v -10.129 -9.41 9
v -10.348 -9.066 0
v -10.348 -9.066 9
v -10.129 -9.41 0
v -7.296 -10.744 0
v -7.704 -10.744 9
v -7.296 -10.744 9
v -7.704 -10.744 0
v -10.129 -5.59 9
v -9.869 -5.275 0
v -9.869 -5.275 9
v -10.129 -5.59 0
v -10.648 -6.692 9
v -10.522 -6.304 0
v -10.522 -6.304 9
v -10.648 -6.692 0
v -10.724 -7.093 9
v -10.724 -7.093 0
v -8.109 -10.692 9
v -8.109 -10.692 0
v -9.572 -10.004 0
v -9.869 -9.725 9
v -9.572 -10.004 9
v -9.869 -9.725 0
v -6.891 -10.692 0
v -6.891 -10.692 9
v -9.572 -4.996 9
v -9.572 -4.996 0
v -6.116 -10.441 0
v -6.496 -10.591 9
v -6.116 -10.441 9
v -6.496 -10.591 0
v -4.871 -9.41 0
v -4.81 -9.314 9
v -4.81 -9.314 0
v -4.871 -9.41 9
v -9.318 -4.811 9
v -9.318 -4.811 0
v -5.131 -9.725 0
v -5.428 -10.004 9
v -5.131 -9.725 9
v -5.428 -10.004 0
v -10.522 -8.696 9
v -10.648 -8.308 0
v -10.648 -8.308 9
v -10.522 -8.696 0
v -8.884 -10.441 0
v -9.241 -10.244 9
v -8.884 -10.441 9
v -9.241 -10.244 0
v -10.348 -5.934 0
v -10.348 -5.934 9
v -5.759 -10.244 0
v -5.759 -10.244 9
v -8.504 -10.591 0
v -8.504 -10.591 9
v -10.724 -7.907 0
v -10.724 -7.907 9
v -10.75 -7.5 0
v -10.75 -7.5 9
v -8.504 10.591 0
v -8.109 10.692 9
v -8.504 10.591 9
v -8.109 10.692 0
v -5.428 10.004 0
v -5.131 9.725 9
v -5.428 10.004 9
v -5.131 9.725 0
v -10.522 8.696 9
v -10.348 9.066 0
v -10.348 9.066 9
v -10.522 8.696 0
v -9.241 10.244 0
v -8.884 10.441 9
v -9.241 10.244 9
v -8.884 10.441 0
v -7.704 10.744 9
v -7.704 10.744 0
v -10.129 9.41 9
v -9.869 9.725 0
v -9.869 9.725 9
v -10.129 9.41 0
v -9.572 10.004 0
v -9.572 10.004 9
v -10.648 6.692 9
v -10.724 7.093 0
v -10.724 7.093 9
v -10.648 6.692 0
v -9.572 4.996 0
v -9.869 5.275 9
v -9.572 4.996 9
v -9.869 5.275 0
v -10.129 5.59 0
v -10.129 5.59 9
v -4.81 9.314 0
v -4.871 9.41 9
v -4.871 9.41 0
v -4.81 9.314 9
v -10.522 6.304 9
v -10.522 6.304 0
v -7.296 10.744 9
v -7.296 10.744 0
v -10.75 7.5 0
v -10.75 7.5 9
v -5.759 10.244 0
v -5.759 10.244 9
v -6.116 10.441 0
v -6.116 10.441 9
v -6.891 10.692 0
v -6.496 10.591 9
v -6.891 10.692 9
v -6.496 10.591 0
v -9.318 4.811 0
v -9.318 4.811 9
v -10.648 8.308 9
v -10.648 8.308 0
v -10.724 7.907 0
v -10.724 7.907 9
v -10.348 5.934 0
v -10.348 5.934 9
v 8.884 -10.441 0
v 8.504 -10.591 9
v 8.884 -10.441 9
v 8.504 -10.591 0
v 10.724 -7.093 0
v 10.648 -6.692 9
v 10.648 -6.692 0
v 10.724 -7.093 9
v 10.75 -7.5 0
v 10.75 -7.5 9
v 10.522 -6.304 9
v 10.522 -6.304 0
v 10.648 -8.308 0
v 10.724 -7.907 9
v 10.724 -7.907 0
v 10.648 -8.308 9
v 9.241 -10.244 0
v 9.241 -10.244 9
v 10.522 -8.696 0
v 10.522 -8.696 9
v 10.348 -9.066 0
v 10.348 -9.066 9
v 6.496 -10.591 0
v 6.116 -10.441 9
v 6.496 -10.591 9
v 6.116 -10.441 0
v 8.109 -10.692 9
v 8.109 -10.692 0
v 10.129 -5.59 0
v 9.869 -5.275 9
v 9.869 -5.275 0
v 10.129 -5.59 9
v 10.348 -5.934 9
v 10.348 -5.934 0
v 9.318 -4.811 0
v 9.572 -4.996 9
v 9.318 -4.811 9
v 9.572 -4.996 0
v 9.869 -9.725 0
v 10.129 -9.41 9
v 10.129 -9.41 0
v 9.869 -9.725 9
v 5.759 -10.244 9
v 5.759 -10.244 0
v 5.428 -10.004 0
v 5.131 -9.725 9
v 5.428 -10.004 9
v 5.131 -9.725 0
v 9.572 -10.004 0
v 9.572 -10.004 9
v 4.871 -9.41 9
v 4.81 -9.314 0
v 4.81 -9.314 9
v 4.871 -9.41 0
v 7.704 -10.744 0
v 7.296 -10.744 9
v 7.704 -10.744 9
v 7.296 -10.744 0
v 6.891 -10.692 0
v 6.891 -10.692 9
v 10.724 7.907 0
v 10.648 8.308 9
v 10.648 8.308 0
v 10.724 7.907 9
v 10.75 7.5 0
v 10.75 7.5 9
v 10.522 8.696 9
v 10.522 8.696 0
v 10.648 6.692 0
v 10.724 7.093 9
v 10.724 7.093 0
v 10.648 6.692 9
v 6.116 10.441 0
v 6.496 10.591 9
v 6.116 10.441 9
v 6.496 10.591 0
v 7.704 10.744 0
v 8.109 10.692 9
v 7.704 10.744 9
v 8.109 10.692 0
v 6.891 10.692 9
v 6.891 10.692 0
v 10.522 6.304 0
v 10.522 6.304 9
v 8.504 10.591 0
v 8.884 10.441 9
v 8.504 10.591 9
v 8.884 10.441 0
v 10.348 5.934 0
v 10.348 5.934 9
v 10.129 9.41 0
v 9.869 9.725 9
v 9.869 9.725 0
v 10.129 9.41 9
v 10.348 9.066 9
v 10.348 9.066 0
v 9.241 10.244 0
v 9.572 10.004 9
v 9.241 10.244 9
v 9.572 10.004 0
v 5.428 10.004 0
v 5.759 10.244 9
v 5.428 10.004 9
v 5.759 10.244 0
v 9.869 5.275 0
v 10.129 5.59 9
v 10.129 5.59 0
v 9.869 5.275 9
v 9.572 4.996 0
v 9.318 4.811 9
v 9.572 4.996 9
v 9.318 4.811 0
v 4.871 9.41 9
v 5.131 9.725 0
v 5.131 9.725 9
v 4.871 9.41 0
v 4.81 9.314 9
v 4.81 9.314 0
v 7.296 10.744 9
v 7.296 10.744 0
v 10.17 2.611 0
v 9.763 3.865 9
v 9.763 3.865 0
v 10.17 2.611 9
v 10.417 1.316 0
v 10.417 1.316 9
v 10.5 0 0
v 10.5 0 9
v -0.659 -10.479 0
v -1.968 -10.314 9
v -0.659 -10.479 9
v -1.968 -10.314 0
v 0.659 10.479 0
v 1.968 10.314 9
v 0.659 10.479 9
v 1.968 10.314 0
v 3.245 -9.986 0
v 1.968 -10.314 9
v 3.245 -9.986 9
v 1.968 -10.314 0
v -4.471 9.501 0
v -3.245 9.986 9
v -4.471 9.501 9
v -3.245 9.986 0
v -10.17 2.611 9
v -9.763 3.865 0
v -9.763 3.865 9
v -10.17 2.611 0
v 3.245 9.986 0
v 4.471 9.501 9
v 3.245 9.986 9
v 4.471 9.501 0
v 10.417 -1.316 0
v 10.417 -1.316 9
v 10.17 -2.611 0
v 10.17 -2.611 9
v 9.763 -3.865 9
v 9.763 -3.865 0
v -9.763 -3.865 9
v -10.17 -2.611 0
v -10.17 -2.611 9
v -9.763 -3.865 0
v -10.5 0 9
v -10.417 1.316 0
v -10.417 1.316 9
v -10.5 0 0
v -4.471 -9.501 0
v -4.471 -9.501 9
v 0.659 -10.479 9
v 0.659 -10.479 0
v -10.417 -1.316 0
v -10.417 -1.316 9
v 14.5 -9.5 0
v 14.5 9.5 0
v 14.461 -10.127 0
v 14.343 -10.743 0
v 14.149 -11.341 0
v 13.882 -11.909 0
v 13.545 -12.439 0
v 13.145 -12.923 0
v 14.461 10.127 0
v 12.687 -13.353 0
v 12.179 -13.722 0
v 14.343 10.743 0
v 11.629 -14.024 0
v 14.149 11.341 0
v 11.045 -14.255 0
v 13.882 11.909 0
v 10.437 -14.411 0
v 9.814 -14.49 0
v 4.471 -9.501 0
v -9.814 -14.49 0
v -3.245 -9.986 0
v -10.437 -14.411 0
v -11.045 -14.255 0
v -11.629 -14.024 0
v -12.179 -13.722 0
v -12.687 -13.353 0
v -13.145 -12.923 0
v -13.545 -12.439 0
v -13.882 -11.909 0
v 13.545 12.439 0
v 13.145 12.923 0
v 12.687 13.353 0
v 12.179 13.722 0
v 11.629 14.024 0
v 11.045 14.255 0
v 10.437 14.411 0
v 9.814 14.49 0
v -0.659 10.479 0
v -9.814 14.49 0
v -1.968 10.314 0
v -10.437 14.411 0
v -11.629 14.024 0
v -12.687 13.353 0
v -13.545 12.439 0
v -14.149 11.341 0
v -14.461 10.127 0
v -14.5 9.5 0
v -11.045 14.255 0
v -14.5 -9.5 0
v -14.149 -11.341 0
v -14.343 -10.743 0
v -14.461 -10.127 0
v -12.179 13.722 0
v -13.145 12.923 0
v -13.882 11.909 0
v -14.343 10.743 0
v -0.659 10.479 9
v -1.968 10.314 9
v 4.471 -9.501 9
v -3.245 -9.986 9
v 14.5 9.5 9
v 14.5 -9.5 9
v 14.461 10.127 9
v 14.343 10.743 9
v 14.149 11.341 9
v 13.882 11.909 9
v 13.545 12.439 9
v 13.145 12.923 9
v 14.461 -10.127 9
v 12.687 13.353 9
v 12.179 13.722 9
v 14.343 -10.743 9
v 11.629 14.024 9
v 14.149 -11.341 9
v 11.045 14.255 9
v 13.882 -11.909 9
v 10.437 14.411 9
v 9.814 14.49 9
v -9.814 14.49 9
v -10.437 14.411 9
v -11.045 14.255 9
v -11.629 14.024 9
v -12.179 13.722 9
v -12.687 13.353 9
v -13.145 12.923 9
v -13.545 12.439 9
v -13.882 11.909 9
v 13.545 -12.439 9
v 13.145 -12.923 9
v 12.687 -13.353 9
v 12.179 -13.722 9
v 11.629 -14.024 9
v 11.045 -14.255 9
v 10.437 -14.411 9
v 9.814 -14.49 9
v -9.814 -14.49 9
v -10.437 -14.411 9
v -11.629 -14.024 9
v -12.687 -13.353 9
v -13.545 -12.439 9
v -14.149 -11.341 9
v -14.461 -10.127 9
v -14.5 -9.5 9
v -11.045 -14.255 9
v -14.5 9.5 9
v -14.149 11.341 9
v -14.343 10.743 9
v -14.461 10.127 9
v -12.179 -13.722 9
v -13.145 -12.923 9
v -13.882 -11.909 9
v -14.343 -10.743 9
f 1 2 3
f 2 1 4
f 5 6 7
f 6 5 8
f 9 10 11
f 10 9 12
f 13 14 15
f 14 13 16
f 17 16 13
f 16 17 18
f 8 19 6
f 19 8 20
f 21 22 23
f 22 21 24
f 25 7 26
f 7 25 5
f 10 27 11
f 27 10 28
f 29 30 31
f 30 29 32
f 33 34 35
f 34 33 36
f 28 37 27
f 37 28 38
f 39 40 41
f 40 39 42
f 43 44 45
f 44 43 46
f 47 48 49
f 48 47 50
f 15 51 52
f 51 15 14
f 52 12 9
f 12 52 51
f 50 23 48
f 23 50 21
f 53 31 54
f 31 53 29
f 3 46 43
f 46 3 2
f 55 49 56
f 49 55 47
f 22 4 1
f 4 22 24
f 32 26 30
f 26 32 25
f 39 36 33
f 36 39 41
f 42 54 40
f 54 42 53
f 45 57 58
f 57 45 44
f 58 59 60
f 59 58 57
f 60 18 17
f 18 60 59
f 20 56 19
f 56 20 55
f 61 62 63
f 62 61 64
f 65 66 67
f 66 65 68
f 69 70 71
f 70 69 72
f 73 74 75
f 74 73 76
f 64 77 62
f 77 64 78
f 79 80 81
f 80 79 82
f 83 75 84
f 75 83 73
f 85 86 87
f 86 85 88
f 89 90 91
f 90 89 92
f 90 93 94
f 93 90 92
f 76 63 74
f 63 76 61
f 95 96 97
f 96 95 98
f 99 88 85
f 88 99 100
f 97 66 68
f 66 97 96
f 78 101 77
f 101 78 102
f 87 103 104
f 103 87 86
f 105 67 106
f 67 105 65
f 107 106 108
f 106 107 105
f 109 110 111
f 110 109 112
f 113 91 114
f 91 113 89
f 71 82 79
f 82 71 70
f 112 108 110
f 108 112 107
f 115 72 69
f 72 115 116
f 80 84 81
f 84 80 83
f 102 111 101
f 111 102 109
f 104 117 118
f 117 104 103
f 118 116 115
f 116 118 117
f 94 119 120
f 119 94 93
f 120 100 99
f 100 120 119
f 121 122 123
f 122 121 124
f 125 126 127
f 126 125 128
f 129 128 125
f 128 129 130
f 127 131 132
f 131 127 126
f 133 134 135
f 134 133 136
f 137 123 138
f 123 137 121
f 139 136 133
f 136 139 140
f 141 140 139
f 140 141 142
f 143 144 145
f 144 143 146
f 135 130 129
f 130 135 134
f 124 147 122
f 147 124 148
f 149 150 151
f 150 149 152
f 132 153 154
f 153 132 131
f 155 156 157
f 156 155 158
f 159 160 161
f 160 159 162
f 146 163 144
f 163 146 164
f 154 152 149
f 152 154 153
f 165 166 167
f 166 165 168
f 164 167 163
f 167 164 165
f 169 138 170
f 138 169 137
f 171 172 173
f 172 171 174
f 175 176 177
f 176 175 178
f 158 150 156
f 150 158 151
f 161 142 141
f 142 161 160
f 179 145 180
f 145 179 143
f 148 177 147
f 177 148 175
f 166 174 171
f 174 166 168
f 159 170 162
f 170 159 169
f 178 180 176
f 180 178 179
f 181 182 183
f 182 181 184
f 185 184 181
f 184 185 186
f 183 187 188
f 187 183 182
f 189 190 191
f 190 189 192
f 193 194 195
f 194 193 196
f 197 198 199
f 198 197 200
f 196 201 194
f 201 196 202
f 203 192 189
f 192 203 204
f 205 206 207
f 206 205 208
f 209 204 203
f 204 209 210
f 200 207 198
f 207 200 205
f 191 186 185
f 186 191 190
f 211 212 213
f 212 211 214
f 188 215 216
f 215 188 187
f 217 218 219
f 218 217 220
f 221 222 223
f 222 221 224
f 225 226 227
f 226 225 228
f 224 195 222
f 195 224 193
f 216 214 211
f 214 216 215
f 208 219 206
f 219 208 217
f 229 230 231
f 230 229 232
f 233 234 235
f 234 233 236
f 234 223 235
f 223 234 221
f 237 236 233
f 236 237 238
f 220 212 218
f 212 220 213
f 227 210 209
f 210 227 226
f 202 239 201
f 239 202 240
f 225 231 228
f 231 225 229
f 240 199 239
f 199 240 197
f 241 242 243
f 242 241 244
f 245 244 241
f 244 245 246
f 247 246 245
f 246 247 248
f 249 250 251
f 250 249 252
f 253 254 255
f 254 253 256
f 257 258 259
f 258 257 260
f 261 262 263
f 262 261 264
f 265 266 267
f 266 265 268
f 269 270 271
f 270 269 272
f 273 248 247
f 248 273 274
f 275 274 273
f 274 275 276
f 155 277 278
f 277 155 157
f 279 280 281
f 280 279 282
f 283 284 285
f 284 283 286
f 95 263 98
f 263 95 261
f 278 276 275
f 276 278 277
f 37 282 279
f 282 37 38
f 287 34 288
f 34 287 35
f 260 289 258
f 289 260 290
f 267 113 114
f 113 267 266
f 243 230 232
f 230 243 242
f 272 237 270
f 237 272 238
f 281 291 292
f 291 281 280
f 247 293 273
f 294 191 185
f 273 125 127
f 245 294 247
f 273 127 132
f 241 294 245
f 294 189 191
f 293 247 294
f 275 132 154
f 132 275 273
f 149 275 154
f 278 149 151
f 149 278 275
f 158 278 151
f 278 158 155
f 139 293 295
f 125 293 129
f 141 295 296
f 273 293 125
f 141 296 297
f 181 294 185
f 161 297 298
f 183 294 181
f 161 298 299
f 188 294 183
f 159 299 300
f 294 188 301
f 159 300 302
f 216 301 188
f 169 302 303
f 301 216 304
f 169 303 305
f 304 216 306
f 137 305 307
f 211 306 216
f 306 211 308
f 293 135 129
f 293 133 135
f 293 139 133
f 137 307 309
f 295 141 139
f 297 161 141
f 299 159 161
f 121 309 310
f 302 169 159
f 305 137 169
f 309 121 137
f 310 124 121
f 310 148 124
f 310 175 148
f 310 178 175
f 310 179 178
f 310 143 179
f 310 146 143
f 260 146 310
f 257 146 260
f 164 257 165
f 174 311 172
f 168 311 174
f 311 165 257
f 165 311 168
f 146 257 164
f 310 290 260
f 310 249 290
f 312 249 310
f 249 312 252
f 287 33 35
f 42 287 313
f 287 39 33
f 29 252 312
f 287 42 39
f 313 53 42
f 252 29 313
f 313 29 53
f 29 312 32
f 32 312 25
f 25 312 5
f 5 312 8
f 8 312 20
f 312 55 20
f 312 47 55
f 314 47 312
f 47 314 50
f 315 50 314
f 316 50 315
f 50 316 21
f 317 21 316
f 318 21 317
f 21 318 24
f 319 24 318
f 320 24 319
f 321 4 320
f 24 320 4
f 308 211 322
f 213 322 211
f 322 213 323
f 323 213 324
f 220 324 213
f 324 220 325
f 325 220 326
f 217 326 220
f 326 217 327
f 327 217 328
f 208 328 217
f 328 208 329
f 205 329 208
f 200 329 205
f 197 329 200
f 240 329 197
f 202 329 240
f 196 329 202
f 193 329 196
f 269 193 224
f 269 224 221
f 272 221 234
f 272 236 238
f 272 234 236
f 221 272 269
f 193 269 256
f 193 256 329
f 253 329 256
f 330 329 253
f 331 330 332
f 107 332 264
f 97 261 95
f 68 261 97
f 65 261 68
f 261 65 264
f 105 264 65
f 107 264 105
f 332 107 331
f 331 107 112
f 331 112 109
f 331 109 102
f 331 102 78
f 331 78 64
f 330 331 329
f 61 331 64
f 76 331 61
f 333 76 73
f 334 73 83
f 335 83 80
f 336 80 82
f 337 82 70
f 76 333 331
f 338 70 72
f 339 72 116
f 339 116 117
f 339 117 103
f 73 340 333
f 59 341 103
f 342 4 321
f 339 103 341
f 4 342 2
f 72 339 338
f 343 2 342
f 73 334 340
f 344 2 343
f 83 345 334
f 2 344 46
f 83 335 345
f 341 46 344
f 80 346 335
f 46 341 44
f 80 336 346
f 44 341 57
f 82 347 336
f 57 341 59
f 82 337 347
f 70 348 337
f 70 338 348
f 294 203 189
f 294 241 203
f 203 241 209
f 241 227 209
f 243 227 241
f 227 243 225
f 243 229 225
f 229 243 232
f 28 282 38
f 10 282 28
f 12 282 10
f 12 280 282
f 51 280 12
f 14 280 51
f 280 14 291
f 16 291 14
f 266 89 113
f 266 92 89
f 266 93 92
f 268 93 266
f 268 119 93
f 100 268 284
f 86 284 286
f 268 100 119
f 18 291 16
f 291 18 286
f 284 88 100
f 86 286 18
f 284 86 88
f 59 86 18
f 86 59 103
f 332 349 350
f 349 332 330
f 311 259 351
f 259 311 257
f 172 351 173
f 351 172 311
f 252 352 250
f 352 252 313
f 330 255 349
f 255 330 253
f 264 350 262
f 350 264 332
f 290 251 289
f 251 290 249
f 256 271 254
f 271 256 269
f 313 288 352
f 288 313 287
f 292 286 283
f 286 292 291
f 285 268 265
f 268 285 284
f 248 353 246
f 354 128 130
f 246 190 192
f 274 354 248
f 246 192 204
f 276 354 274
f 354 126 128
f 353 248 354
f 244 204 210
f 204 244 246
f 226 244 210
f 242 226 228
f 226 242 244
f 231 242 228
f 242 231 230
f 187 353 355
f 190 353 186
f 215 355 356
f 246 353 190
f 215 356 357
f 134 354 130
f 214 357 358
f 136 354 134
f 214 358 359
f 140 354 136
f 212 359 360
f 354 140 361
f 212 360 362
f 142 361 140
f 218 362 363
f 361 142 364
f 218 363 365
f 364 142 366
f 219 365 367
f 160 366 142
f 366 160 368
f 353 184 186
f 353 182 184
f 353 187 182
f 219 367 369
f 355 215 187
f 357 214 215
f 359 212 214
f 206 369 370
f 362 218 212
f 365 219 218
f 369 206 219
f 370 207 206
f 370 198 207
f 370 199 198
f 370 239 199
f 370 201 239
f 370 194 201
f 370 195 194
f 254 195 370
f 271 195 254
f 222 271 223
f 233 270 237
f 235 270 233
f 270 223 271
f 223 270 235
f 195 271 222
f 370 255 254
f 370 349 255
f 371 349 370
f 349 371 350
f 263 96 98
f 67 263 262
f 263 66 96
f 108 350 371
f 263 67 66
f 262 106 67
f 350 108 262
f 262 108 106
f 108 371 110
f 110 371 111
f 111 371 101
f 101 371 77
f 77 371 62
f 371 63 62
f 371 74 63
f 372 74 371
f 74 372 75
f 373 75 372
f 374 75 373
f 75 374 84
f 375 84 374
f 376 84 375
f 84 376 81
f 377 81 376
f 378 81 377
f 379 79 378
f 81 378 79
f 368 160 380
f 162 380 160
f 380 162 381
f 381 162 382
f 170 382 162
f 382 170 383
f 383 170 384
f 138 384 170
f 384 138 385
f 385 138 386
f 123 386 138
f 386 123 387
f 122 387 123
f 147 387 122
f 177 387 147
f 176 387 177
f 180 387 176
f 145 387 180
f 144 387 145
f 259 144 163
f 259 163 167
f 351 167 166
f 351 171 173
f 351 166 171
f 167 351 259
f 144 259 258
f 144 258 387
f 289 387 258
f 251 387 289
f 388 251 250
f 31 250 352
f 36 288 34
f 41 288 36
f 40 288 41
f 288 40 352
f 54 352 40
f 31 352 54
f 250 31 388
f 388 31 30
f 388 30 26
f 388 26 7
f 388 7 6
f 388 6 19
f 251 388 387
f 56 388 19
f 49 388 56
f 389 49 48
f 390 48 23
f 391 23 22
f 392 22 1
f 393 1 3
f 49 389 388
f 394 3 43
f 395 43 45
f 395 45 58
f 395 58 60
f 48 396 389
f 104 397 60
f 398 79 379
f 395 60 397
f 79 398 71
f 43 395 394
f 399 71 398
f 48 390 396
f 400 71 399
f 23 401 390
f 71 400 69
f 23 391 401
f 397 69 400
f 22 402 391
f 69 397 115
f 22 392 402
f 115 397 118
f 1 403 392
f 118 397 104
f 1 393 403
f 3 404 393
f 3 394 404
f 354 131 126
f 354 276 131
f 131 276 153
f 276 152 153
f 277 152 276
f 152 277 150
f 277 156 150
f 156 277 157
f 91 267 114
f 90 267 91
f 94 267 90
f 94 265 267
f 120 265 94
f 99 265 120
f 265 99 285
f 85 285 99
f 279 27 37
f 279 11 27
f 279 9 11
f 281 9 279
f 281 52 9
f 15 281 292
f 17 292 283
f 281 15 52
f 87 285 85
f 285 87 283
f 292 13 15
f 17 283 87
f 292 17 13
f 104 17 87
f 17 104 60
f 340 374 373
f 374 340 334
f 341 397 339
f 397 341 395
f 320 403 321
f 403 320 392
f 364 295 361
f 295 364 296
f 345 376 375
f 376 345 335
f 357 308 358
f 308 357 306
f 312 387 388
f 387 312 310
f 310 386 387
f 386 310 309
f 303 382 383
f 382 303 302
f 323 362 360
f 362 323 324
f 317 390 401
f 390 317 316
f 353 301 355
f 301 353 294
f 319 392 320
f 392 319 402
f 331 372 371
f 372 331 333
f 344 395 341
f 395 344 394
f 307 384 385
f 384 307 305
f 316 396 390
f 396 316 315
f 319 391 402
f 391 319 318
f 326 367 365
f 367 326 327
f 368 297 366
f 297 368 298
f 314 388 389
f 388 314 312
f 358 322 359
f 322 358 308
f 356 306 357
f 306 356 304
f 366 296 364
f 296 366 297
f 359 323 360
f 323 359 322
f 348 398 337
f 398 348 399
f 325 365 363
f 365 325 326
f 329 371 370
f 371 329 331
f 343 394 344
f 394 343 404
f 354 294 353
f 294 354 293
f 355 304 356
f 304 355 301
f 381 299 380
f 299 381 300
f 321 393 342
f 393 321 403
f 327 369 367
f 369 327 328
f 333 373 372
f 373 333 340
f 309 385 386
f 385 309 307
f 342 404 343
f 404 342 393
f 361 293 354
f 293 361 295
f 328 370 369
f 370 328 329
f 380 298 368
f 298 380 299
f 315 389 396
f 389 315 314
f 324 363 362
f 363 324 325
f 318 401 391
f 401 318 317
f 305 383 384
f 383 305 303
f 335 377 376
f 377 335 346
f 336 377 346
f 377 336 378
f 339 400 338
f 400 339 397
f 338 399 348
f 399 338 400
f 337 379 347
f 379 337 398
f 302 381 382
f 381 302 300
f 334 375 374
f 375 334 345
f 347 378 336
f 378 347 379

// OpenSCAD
$fn = 50;


difference() {
	union() {
		hull() {
			translate(v = [-9.5000000000, 9.5000000000, 0]) {
				cylinder(h = 9, r = 5);
			}
			translate(v = [9.5000000000, 9.5000000000, 0]) {
				cylinder(h = 9, r = 5);
			}
			translate(v = [-9.5000000000, -9.5000000000, 0]) {
				cylinder(h = 9, r = 5);
			}
			translate(v = [9.5000000000, -9.5000000000, 0]) {
				cylinder(h = 9, r = 5);
			}
		}
	}
	union() {
		#translate(v = [-7.5000000000, -7.5000000000, -100.0000000000]) {
			cylinder(h = 200, r = 3.2500000000);
		}
		#translate(v = [-7.5000000000, 7.5000000000, -100.0000000000]) {
			cylinder(h = 200, r = 3.2500000000);
		}
		#translate(v = [7.5000000000, -7.5000000000, -100.0000000000]) {
			cylinder(h = 200, r = 3.2500000000);
		}
		#translate(v = [7.5000000000, 7.5000000000, -100.0000000000]) {
			cylinder(h = 200, r = 3.2500000000);
		}
		#cylinder(h = 9, r = 10.5000000000);
	}
}
